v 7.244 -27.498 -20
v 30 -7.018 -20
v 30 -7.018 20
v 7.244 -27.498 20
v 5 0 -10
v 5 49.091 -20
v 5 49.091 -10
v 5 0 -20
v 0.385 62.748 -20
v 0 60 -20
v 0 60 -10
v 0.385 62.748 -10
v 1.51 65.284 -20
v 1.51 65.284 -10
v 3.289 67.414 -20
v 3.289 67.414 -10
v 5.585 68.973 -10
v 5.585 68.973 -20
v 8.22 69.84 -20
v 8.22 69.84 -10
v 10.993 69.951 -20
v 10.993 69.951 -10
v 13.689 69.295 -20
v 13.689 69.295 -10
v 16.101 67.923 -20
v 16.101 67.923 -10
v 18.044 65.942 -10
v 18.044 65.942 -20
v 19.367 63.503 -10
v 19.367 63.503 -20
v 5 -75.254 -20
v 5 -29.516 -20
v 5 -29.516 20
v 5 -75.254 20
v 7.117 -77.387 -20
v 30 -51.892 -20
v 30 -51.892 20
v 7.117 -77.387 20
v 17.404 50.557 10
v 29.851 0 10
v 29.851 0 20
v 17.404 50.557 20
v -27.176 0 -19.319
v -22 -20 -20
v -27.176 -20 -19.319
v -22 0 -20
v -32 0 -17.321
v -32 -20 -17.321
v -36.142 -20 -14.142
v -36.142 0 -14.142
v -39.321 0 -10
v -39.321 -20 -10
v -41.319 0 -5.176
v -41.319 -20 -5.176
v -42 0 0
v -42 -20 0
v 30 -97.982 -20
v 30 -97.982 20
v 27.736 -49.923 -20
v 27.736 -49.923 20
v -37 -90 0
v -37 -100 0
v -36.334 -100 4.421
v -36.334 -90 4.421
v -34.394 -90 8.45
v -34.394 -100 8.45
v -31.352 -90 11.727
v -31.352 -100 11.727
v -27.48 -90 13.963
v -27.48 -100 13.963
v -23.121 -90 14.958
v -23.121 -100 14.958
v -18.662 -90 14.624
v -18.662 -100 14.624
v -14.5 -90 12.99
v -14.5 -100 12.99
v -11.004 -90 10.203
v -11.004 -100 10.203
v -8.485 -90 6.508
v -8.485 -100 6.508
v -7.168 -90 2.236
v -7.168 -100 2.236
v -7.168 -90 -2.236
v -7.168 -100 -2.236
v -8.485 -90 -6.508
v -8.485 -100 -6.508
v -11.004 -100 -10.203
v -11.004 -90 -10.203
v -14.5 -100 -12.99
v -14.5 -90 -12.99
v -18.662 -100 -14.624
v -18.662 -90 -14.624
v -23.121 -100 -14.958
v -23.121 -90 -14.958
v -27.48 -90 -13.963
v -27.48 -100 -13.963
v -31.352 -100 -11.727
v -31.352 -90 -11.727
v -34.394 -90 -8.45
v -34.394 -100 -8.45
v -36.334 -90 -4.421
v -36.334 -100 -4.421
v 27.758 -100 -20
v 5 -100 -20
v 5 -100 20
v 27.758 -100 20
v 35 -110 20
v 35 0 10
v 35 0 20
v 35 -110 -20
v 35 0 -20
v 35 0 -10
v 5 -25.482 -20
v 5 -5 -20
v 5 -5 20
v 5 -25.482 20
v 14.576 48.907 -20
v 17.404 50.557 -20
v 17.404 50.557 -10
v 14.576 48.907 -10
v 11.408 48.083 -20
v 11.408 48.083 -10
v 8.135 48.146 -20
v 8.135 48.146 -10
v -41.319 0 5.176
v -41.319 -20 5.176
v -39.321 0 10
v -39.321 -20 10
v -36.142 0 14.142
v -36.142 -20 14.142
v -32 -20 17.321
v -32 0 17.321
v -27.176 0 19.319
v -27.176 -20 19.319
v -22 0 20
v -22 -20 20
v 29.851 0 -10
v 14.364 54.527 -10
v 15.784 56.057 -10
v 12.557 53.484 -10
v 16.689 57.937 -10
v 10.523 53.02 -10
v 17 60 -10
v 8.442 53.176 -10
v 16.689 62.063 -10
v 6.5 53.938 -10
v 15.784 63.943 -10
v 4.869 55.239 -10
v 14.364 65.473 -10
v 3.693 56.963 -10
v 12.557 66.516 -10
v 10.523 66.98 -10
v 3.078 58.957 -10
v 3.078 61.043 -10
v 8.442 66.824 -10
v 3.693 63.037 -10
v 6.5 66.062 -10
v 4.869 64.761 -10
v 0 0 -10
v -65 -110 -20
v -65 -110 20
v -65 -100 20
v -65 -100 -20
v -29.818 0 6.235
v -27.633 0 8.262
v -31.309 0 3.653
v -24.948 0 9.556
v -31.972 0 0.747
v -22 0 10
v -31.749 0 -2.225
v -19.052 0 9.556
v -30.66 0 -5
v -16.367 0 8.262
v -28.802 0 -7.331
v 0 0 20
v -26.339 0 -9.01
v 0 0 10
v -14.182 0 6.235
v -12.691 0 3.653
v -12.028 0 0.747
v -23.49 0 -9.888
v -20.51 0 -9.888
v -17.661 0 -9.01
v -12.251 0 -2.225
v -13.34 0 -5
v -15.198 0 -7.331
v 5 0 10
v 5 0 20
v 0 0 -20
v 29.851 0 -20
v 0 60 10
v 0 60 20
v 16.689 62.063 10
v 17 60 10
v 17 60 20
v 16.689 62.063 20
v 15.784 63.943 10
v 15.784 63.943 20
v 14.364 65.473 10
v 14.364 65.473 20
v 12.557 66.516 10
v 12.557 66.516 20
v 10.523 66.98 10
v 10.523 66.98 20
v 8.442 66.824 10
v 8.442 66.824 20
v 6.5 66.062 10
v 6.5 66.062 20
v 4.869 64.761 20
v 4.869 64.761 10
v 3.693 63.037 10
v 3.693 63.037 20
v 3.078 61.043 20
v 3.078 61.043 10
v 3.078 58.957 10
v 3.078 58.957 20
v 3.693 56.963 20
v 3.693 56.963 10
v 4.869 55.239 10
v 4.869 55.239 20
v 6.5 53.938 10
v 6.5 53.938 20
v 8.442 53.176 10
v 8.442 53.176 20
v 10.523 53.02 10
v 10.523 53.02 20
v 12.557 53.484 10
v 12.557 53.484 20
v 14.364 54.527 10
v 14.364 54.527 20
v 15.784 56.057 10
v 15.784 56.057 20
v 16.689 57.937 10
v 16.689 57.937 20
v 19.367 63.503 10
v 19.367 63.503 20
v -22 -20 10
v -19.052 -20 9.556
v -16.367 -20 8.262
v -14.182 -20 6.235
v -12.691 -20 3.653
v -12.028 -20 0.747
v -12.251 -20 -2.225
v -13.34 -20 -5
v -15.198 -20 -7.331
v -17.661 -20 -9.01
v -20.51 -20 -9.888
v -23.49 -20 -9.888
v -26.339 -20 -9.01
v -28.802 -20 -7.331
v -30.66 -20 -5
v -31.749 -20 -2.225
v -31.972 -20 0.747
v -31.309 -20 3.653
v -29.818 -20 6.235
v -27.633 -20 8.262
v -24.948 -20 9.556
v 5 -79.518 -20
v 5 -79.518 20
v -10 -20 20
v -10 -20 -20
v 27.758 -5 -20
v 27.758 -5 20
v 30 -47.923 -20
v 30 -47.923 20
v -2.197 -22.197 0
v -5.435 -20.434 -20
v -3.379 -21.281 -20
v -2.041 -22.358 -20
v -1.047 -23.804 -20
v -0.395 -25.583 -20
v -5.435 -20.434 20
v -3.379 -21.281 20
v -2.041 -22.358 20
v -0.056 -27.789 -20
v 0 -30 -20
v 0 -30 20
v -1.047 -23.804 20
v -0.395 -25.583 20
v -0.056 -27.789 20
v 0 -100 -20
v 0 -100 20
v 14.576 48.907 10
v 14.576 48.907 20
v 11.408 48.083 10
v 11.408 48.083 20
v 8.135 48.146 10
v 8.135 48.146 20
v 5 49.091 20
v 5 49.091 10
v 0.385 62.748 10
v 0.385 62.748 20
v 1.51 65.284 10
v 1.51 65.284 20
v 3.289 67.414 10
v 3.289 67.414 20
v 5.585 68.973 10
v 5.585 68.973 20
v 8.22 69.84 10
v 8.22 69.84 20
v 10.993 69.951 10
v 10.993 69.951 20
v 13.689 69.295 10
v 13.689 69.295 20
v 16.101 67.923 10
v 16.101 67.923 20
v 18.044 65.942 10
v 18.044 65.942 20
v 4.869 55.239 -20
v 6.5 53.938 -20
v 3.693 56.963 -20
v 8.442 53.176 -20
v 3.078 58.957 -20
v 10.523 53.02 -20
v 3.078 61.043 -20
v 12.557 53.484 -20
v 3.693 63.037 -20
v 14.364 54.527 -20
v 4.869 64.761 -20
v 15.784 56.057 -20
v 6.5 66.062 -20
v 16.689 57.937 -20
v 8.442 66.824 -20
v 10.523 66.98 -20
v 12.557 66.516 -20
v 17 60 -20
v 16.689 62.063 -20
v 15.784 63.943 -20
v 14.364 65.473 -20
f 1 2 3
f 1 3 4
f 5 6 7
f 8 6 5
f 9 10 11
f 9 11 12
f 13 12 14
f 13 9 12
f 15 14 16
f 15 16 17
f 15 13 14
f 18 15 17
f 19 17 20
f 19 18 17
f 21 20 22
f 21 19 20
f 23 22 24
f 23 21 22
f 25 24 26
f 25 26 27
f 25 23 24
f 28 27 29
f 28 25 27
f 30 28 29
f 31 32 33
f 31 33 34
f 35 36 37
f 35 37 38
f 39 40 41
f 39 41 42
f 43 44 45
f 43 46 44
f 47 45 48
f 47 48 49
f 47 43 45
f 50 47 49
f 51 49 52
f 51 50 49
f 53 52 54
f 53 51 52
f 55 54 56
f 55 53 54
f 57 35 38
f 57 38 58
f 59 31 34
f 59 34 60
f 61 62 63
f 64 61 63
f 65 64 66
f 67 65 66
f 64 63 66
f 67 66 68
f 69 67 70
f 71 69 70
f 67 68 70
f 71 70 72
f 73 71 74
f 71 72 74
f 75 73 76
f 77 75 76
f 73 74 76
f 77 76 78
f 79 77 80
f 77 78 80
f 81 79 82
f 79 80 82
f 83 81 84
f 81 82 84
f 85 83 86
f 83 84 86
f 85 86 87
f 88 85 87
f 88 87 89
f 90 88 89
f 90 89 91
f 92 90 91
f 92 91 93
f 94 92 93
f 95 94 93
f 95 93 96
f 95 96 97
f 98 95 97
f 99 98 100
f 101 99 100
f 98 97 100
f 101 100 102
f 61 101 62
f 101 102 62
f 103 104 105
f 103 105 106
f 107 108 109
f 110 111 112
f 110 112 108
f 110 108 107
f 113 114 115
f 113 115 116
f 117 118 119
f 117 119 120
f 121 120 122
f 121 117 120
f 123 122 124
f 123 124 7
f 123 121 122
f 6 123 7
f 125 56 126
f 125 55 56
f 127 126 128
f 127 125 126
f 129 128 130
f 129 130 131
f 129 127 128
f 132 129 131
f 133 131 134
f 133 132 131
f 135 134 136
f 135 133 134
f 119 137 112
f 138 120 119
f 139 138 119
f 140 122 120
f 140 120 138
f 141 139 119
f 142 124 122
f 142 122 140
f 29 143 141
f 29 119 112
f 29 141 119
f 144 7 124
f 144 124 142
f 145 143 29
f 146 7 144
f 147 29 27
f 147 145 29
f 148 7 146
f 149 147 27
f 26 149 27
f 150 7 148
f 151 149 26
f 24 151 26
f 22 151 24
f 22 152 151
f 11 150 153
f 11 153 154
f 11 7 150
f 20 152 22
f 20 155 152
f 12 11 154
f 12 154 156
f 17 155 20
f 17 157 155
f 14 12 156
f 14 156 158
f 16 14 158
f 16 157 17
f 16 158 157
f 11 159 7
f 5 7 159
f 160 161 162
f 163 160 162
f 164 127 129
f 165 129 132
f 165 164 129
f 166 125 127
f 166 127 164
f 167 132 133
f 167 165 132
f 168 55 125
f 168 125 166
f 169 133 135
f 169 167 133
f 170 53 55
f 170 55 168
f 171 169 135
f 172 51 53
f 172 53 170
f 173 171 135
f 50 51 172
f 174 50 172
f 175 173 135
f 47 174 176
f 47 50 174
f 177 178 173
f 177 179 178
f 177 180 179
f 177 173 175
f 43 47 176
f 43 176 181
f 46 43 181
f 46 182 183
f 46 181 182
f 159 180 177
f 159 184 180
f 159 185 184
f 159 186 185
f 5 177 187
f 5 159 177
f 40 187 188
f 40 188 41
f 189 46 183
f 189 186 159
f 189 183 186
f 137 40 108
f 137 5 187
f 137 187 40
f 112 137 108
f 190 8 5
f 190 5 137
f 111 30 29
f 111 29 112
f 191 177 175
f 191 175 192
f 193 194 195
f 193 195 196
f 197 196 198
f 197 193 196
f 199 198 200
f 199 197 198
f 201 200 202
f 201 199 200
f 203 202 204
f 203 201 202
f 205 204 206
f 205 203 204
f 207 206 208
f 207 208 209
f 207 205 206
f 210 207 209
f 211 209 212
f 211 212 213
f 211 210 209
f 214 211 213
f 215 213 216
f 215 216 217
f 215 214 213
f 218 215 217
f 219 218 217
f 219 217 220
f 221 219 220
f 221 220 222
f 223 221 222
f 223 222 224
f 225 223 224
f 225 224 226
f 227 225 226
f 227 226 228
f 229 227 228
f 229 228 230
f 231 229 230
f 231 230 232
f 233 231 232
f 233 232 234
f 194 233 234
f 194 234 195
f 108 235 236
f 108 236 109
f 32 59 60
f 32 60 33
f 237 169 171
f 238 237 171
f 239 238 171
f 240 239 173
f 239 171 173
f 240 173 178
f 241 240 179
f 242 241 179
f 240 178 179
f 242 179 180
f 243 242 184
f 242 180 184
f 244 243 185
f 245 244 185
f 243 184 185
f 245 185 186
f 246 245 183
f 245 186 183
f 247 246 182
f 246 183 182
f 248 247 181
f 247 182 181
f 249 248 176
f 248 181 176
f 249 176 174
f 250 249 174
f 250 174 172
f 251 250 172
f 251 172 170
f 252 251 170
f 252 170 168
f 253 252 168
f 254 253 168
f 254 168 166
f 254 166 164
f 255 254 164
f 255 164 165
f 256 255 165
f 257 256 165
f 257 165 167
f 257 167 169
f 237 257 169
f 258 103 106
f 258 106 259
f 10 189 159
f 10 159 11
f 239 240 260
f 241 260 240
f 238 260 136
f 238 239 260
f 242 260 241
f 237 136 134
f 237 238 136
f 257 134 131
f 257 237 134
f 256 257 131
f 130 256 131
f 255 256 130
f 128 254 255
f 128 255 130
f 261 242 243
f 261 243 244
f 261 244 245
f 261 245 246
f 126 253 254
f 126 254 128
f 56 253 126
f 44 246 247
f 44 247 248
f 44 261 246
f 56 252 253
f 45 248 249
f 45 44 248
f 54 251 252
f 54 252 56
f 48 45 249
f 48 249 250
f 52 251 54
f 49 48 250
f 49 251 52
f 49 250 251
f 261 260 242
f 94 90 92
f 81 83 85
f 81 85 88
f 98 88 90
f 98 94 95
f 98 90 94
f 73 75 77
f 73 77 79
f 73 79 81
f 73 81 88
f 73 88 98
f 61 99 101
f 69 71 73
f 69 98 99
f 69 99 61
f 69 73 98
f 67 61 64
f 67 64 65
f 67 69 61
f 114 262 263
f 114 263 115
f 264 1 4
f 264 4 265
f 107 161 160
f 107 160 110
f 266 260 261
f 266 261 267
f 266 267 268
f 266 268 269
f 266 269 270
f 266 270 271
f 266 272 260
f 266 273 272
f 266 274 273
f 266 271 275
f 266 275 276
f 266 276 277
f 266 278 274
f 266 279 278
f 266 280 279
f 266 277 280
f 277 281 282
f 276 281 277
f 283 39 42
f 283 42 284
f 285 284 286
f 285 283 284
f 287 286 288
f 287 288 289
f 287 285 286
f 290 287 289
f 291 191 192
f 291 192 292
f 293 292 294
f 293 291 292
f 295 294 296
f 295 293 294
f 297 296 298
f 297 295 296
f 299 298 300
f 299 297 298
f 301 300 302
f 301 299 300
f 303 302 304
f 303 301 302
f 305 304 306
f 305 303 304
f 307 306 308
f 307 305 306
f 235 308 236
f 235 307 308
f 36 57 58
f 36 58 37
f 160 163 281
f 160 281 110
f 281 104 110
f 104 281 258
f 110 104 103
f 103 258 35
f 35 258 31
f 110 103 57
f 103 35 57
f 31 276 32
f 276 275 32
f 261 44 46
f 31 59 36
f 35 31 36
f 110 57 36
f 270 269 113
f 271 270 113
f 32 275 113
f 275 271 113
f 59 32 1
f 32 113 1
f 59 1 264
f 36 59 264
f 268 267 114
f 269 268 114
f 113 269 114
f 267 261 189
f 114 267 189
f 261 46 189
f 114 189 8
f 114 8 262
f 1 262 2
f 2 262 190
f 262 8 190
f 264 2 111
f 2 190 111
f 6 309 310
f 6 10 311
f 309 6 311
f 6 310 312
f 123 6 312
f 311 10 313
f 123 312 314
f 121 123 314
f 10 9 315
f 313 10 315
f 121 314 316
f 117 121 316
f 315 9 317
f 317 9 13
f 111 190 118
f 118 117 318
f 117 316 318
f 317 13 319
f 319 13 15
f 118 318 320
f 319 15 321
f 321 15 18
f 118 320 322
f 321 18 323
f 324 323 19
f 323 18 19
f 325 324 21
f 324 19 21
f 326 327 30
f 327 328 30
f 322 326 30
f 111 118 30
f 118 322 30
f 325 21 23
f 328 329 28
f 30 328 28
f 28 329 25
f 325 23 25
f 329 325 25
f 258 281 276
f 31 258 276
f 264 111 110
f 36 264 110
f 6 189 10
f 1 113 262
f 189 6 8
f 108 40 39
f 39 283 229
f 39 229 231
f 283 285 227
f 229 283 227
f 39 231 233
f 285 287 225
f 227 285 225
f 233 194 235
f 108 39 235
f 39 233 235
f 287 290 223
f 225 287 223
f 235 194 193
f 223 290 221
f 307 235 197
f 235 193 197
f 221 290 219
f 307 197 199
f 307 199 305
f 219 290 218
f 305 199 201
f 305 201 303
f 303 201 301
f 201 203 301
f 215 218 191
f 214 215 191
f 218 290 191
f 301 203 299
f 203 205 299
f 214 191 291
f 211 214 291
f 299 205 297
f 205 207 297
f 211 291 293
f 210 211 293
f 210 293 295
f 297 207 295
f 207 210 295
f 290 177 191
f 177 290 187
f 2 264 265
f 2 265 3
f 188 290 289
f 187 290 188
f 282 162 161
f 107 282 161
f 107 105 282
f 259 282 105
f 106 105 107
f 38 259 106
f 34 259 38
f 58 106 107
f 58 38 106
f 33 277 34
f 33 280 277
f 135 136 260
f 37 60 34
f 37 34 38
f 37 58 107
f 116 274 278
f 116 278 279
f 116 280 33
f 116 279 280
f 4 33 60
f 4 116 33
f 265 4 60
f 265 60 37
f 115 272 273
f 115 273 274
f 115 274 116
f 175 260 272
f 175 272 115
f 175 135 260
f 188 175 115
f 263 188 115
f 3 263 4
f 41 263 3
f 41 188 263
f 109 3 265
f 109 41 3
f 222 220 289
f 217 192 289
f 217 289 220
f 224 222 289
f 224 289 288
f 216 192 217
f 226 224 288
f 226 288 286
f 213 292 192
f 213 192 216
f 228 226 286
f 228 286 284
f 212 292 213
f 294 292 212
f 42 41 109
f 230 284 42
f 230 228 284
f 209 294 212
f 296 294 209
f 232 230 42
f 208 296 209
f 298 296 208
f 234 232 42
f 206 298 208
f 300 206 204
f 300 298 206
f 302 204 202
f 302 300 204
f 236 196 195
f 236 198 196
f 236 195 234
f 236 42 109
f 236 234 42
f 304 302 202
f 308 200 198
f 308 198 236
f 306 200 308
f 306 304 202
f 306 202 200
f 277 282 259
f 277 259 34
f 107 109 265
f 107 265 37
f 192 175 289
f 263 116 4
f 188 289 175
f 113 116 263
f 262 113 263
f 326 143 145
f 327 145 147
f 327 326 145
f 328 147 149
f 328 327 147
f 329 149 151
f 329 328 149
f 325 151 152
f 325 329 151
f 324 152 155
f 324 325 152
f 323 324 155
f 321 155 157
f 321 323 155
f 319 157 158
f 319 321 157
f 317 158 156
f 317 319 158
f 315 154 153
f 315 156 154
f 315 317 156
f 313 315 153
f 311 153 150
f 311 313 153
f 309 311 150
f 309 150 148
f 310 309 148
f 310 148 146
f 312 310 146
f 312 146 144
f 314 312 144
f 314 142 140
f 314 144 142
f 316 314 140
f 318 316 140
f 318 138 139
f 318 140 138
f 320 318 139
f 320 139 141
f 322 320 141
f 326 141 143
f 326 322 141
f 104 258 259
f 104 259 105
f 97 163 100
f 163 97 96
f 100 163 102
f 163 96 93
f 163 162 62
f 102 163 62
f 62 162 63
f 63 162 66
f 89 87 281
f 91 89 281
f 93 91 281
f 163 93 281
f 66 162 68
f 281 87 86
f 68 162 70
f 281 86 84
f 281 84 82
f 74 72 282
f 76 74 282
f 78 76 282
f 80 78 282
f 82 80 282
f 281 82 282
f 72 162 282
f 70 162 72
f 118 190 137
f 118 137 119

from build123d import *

# Parameters (mm, degrees)
BOSS_EXTRUDE1_DEPTH      = 20
BOSS_EXTRUDE1_DEPTH_BACK = 20
SKETCH1_R                = 7
SKETCH2_W                = 100
SKETCH2_H                = 10
BOSS_EXTRUDE2_DEPTH      = 40
FILLET1_R                = 20
SKETCH3_R                = 10
CUT_EXTRUDE1_DEPTH       = 40
FILLET2_SIZE             = 10
SKETCH4_W                = 20
SKETCH4_H                = 70
CUT_EXTRUDE2_DEPTH       = 50
SKETCH5_R                = 15
BOSS_EXTRUDE3_DEPTH      = 10
CUT_EXTRUDE4_DEPTH       = 10
CUT_EXTRUDE4_DEPTH_BACK  = 56


# Some blends are built 0.0001 mm under size
with BuildPart() as part:
    # Sketch1 → Boss-Extrude1 (new, two sides: drawn at the far end of the back side and taken through both)
    with BuildSketch(Plane.XY.offset(-BOSS_EXTRUDE1_DEPTH_BACK)):
        with BuildLine():
            Line((0, 0), (0, 60))
            ThreePointArc((0, 60), (8.220336618, 69.840365758), (19.36655965, 63.502507721))
            Line((19.36655965, 63.502507721), (35, 0))
            Line((35, 0), (35, -110))
            Line((35, -110), (0, -110))
            Line((0, -110), (0, -90))
            Line((0, -90), (0, -20))
            Line((0, -20), (-42, -20))
            Line((-42, -20), (-42, 0))
            Line((-42, 0), (0, 0))
        make_face()
        with Locations((10, 60)):
            Circle(SKETCH1_R, mode=Mode.SUBTRACT)
    extrude(amount=BOSS_EXTRUDE1_DEPTH + BOSS_EXTRUDE1_DEPTH_BACK)

    # Sketch2 → Boss-Extrude2 (add)
    with BuildSketch(Plane.XY.offset(20)):
        with Locations((-15, -105)):
            Rectangle(SKETCH2_W, SKETCH2_H)
    extrude(amount=-BOSS_EXTRUDE2_DEPTH)

    # Fillet1
    fillet1_edges = [part.edges().sort_by_distance(p)[0] for p in [
        (-42, -10, 20),
        (-42, -10, -20),
    ]]
    fillet(fillet1_edges, radius=FILLET1_R - 0.0001)  # a hair under: the kernel refuses the full size

    # Sketch3 → Cut-Extrude1 (cut)
    with BuildSketch(Plane(origin=(0, 0, 0), x_dir=(1, 0, 0), z_dir=(0, 1, 0))):
        with Locations(Location((-22, 0, 0), (0, 0, 270))):
            Circle(SKETCH3_R)
    extrude(amount=-CUT_EXTRUDE1_DEPTH, mode=Mode.SUBTRACT)

    # Fillet2
    # a fillet whose section is not a circle: 10 mm, written as the material it adds along each edge
    with BuildSketch(Plane(origin=(0, -20, 20), x_dir=(-1, 0, 0), z_dir=(0, 0, -1))) as fillet2_piece_1:
        with BuildLine():
            add(Edge.make_bspline([(FILLET2_SIZE, 0), (FILLET2_SIZE * 0.831801948466, 0), (FILLET2_SIZE * 0.663603896932, 0), (FILLET2_SIZE * 0.292893218813, -FILLET2_SIZE * 0.0716919198361), (FILLET2_SIZE * 0.0716919198361, -FILLET2_SIZE * 0.292893218813), (0, -FILLET2_SIZE * 0.663603896932), (0, -FILLET2_SIZE * 0.831801948466), (0, -FILLET2_SIZE)], knots=[0, 0, 0, 0, 0, 0, 0.5, 0.5, 1, 1, 1, 1, 1, 1], degree=5))
            Line((0, -FILLET2_SIZE), (-FILLET2_SIZE * 0.02, -FILLET2_SIZE))
            Line((-FILLET2_SIZE * 0.02, -FILLET2_SIZE), (-FILLET2_SIZE * 0.02, FILLET2_SIZE * 0.02))
            Line((-FILLET2_SIZE * 0.02, FILLET2_SIZE * 0.02), (FILLET2_SIZE, FILLET2_SIZE * 0.02))
            Line((FILLET2_SIZE, FILLET2_SIZE * 0.02), (FILLET2_SIZE, 0))
        make_face()
    extrude(amount=40)

    # Sketch4 → Cut-Extrude2 (cut)
    with BuildSketch(Plane.ZY):
        with Locations((0, 35)):
            Rectangle(SKETCH4_W, SKETCH4_H)
    extrude(amount=-CUT_EXTRUDE2_DEPTH, mode=Mode.SUBTRACT)

    # Sketch5 → Boss-Extrude3 (add)
    with BuildSketch(Plane(origin=(0, -100, 0), x_dir=(1, 0, 0), z_dir=(0, 1, 0))):
        with Locations(Location((-22, 0, 0), (0, 0, 180))):
            Circle(SKETCH5_R)
    extrude(amount=BOSS_EXTRUDE3_DEPTH)

    # Sketch6 → Cut-Extrude4 (cut, two sides: drawn at the far end of the back side and taken through both)
    with BuildSketch(Plane.XY.offset(20).offset(-CUT_EXTRUDE4_DEPTH_BACK)):
        Polygon((30, -47.923364513), (30, -7.018043607), (7.243954377, -27.498484668), align=None)
        Polygon((27.757729325, -5), (5, -5), (5, -25.481956393), align=None)
        Polygon((27.736463224, -49.922898925), (5, -29.515595427), (5, -30), (5, -75.254357341), align=None)
        Polygon((30, -97.981956393), (30, -51.892301788), (7.116883504, -77.387151546), align=None)
        Polygon((27.757729325, -100), (5, -79.518043607), (5, -100), align=None)
        with BuildLine():
            Line((29.850709662, 0), (17.404345208, 50.556712859))
            ThreePointArc((17.404345208, 50.556712859), (11.407865959, 48.082873105), (5, 49.091287885))
            Line((5, 49.091287885), (5, 0))
            Line((5, 0), (29.850709662, 0))
        make_face()
    extrude(amount=CUT_EXTRUDE4_DEPTH + CUT_EXTRUDE4_DEPTH_BACK, mode=Mode.SUBTRACT)


solid = part.part
